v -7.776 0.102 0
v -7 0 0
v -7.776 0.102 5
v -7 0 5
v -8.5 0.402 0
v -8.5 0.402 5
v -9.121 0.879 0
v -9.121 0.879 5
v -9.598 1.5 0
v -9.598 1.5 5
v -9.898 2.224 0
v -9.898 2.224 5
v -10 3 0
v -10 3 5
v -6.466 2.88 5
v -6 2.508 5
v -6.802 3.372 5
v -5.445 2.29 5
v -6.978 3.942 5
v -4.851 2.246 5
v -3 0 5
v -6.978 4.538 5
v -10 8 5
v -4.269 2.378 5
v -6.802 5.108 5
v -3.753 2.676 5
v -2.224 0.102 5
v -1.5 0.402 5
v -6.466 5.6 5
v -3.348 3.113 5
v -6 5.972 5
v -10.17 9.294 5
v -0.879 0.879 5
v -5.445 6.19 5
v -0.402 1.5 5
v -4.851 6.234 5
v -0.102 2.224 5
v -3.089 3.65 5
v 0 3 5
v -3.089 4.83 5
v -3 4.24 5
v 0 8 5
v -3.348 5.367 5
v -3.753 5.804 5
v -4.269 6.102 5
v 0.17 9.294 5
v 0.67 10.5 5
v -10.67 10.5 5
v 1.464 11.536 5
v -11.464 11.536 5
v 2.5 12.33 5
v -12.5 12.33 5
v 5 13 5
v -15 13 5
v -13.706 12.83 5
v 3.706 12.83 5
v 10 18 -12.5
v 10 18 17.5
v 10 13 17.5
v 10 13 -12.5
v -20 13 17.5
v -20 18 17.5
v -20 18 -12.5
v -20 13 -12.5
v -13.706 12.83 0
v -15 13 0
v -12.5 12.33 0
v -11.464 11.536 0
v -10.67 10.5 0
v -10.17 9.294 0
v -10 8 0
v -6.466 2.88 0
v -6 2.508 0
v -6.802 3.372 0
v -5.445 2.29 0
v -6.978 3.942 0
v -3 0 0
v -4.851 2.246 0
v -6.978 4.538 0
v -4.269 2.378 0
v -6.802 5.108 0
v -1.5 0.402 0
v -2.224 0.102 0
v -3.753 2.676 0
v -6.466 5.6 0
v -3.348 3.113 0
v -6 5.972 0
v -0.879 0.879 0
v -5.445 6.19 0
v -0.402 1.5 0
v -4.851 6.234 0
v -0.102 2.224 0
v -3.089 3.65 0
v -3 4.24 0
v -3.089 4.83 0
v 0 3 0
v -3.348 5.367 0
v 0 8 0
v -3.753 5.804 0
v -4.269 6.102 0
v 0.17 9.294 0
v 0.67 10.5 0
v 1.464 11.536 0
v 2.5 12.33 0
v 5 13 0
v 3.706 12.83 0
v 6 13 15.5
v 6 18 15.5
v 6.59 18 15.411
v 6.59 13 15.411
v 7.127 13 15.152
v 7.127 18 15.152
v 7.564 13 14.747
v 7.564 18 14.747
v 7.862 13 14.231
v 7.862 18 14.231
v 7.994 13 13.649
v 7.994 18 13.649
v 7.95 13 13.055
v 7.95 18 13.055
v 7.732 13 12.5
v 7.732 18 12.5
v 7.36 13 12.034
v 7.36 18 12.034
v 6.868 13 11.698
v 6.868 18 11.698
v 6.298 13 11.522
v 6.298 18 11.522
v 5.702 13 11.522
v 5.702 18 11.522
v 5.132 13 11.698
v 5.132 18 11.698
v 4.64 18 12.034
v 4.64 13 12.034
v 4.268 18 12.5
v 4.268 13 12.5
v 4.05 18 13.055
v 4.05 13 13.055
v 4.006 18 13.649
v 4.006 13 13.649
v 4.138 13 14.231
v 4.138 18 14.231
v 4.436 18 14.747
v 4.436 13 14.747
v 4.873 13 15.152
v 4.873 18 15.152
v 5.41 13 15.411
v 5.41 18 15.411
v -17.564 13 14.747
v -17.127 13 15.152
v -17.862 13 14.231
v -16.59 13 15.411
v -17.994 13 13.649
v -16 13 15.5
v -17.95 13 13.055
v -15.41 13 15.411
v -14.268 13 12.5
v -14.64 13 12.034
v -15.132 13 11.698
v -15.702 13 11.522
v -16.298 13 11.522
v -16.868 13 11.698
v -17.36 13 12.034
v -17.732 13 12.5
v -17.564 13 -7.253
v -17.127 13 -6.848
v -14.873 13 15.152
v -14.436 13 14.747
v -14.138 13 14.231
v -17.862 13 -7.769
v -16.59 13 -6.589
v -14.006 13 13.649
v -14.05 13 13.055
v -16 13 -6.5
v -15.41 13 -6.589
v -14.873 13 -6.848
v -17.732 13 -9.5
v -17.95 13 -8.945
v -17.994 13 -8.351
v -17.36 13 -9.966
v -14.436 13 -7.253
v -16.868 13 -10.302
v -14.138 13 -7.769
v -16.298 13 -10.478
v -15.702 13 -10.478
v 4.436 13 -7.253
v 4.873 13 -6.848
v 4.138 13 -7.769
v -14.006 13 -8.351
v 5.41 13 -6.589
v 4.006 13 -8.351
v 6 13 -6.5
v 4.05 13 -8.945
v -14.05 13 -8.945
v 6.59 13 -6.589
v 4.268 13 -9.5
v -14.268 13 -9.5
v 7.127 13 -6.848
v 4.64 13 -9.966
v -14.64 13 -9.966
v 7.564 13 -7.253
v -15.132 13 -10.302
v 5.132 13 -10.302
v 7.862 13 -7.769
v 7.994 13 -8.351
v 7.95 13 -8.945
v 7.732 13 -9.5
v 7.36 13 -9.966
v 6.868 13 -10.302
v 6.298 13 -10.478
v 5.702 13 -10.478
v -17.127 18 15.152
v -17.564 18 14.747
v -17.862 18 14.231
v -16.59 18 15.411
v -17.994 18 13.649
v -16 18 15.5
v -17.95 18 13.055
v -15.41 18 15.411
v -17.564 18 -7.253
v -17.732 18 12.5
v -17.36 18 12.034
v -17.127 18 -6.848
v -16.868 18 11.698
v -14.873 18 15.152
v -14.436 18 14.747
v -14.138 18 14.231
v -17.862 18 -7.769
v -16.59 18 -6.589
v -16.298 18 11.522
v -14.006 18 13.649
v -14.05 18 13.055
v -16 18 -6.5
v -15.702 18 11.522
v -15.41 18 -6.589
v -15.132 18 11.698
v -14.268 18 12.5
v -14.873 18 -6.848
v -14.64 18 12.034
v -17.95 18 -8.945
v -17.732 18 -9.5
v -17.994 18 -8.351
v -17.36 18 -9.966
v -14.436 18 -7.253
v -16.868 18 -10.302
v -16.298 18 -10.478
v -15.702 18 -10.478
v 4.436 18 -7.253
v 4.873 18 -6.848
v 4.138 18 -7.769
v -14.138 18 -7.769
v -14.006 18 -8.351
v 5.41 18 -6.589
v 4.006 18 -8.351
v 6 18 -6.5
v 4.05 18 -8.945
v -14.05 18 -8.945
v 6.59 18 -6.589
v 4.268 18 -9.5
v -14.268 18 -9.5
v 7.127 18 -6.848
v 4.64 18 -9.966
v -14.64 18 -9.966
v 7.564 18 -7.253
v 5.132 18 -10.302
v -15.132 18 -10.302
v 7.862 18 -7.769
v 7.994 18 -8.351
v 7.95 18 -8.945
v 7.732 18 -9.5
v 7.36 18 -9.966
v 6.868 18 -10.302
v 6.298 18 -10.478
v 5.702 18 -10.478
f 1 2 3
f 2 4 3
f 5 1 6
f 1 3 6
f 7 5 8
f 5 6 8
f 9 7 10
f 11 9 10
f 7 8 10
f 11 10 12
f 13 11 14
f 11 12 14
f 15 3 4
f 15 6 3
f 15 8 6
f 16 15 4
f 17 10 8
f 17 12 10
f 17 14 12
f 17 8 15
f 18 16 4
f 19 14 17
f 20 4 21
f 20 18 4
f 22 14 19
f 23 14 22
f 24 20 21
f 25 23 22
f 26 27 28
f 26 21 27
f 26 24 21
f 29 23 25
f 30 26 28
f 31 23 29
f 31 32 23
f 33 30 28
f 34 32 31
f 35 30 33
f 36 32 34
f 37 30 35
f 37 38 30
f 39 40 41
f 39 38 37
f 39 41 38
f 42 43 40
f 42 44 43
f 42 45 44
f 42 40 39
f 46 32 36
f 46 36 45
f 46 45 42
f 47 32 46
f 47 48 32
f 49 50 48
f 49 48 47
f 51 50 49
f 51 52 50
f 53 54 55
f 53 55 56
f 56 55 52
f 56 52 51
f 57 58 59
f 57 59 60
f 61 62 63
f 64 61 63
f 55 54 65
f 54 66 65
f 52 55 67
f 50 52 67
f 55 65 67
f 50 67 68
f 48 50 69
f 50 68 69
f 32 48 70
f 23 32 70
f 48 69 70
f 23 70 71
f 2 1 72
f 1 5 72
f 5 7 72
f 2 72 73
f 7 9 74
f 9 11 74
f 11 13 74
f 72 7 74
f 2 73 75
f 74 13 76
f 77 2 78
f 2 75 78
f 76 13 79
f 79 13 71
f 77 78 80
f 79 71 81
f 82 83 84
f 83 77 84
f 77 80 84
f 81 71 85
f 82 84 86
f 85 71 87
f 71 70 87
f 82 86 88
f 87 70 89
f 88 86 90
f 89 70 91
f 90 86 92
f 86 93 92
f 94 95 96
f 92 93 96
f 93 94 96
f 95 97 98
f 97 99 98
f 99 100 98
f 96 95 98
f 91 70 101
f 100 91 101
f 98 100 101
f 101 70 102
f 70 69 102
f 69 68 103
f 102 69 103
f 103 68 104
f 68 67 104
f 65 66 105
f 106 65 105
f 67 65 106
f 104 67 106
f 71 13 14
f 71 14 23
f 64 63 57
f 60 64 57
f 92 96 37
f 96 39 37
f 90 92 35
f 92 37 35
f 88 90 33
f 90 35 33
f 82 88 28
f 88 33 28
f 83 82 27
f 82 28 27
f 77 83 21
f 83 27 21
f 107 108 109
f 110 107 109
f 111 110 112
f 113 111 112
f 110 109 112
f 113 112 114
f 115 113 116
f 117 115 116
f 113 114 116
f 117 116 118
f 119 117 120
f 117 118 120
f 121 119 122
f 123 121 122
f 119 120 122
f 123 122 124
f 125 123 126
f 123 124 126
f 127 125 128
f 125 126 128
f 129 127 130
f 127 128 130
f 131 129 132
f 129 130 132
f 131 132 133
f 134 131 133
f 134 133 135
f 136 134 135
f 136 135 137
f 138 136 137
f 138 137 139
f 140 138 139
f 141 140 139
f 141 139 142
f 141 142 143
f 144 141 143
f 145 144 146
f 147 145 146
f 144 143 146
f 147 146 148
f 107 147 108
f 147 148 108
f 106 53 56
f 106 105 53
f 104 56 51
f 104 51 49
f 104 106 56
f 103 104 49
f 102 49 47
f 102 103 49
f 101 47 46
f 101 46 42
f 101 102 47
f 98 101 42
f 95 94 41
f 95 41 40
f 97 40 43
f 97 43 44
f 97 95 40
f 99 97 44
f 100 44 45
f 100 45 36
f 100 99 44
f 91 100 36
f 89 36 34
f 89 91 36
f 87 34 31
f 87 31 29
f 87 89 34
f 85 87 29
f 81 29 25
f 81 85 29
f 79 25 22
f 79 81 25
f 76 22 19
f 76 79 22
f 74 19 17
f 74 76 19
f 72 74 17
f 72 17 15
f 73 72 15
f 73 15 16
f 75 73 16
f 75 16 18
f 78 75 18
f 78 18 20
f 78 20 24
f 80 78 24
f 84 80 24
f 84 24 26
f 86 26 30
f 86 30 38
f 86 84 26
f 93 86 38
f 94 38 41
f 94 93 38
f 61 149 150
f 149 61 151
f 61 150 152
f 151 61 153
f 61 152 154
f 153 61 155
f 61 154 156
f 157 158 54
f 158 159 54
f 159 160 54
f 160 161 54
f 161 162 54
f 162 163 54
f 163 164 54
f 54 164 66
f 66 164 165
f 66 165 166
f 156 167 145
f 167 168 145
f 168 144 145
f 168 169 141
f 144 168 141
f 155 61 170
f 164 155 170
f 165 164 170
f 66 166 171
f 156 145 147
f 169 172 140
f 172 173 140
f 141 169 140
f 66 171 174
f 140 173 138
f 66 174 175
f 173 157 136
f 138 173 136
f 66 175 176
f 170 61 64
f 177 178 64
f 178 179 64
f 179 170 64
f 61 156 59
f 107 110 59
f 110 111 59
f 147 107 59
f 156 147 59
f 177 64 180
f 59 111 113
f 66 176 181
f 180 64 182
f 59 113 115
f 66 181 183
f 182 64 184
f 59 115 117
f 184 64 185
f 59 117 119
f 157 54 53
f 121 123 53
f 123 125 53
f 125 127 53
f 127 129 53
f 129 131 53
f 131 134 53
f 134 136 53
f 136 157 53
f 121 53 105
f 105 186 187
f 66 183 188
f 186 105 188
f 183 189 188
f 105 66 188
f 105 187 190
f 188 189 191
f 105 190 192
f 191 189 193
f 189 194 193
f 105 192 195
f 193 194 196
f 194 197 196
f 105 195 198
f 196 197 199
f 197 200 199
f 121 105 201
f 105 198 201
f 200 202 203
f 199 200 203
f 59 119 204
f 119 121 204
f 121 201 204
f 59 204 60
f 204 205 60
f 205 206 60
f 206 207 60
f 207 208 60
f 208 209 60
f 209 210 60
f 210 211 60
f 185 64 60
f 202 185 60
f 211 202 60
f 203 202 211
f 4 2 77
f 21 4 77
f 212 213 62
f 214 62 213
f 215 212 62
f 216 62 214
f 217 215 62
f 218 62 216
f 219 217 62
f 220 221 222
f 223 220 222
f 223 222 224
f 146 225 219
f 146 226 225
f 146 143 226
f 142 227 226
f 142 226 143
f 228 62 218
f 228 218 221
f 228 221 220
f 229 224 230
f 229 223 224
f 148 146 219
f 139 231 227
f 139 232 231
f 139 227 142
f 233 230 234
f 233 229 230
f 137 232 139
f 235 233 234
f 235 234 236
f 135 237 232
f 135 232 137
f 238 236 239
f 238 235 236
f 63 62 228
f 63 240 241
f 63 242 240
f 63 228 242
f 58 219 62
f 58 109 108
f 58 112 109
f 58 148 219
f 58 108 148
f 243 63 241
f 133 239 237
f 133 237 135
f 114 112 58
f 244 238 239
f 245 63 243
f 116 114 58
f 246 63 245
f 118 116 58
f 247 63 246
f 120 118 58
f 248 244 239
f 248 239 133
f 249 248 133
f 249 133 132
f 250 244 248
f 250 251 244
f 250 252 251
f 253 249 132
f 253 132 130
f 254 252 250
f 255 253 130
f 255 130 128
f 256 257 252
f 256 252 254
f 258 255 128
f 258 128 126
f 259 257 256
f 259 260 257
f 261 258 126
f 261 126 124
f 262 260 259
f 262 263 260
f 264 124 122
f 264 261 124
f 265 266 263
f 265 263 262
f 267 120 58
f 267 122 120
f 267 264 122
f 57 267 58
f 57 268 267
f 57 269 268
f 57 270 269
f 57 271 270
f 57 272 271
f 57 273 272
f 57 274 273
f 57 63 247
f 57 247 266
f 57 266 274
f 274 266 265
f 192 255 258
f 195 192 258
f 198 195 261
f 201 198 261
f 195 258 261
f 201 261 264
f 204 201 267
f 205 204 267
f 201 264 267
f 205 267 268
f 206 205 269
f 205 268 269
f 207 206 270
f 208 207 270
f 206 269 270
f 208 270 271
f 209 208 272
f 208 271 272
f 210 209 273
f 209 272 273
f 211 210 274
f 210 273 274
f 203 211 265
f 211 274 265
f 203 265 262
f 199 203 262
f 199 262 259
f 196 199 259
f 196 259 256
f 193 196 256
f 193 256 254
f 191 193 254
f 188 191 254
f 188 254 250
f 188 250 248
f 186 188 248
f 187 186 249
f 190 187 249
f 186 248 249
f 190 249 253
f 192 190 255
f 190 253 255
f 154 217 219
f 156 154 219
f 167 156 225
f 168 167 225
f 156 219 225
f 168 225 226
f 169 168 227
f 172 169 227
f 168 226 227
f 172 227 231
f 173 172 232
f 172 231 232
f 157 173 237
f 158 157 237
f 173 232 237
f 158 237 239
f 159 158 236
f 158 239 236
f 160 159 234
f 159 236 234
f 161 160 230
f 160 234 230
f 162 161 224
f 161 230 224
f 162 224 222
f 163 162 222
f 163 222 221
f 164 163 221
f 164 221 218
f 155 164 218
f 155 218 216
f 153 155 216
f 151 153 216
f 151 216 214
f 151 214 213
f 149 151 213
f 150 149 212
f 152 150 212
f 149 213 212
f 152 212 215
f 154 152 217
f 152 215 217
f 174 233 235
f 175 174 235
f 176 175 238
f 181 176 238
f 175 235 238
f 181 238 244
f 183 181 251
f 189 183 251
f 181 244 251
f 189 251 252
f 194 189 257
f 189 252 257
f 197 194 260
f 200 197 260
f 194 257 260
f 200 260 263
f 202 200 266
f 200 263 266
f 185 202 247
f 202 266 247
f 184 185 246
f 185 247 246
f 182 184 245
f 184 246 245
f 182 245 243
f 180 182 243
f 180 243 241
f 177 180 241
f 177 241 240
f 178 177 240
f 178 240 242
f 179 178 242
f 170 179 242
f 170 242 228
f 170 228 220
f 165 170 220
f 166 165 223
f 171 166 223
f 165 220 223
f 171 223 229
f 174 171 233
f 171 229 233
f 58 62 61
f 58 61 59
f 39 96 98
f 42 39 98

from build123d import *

# Parameters (mm, degrees)
SKETCH2_W           = 10
SKETCH2_H           = 18
SKETCH2_R           = 2
BOSS_EXTRUDE1_DEPTH = 5
SKETCH3_W           = 30
SKETCH3_H           = 30
BOSS_EXTRUDE2_DEPTH = 5
FILLET1_R           = 5
FILLET2_R           = 3
SKETCH4_R           = 2
CUT_EXTRUDE1_DEPTH  = 5


with BuildPart() as part:
    # Sketch2 → Boss-Extrude1 (new body)
    with BuildSketch(Plane.XY):
        with Locations((-5, 9)):
            Rectangle(SKETCH2_W, SKETCH2_H)
        with Locations((-5, 4.24)):
            Circle(SKETCH2_R, mode=Mode.SUBTRACT)
    extrude(amount=BOSS_EXTRUDE1_DEPTH)

    # Sketch3 → Boss-Extrude2 (add)
    with BuildSketch(Plane(origin=(0, 18, 0), x_dir=(1, 0, 0), z_dir=(0, 1, 0))):
        with Locations((-5, -2.5)):
            Rectangle(SKETCH3_W, SKETCH3_H)
    extrude(amount=-BOSS_EXTRUDE2_DEPTH)

    # Fillet1
    fillet1_edges = [part.edges().sort_by_distance(p)[0] for p in [
        (0, 13, 2.5),
        (-10, 13, 2.5),
    ]]
    fillet(fillet1_edges, radius=FILLET1_R)

    # Fillet2
    fillet2_edges = [part.edges().sort_by_distance(p)[0] for p in [
        (0, 0, 2.5),
        (-10, 0, 2.5),
    ]]
    fillet(fillet2_edges, radius=FILLET2_R)

    # Sketch4 → Cut-Extrude1 (cut)
    with BuildSketch(Plane(origin=(0, 18, 0), x_dir=(1, 0, 0), z_dir=(0, 1, 0))):
        with Locations(Location((-16, 8.5, 0), (0, 0, 270))):
            Circle(SKETCH4_R)
        with Locations(Location((6, 8.5, 0), (0, 0, 270))):
            Circle(SKETCH4_R)
        with Locations(Location((6, -13.5, 0), (0, 0, 270))):
            Circle(SKETCH4_R)
        with Locations(Location((-16, -13.5, 0), (0, 0, 270))):
            Circle(SKETCH4_R)
    extrude(amount=-CUT_EXTRUDE1_DEPTH, mode=Mode.SUBTRACT)


solid = part.part
